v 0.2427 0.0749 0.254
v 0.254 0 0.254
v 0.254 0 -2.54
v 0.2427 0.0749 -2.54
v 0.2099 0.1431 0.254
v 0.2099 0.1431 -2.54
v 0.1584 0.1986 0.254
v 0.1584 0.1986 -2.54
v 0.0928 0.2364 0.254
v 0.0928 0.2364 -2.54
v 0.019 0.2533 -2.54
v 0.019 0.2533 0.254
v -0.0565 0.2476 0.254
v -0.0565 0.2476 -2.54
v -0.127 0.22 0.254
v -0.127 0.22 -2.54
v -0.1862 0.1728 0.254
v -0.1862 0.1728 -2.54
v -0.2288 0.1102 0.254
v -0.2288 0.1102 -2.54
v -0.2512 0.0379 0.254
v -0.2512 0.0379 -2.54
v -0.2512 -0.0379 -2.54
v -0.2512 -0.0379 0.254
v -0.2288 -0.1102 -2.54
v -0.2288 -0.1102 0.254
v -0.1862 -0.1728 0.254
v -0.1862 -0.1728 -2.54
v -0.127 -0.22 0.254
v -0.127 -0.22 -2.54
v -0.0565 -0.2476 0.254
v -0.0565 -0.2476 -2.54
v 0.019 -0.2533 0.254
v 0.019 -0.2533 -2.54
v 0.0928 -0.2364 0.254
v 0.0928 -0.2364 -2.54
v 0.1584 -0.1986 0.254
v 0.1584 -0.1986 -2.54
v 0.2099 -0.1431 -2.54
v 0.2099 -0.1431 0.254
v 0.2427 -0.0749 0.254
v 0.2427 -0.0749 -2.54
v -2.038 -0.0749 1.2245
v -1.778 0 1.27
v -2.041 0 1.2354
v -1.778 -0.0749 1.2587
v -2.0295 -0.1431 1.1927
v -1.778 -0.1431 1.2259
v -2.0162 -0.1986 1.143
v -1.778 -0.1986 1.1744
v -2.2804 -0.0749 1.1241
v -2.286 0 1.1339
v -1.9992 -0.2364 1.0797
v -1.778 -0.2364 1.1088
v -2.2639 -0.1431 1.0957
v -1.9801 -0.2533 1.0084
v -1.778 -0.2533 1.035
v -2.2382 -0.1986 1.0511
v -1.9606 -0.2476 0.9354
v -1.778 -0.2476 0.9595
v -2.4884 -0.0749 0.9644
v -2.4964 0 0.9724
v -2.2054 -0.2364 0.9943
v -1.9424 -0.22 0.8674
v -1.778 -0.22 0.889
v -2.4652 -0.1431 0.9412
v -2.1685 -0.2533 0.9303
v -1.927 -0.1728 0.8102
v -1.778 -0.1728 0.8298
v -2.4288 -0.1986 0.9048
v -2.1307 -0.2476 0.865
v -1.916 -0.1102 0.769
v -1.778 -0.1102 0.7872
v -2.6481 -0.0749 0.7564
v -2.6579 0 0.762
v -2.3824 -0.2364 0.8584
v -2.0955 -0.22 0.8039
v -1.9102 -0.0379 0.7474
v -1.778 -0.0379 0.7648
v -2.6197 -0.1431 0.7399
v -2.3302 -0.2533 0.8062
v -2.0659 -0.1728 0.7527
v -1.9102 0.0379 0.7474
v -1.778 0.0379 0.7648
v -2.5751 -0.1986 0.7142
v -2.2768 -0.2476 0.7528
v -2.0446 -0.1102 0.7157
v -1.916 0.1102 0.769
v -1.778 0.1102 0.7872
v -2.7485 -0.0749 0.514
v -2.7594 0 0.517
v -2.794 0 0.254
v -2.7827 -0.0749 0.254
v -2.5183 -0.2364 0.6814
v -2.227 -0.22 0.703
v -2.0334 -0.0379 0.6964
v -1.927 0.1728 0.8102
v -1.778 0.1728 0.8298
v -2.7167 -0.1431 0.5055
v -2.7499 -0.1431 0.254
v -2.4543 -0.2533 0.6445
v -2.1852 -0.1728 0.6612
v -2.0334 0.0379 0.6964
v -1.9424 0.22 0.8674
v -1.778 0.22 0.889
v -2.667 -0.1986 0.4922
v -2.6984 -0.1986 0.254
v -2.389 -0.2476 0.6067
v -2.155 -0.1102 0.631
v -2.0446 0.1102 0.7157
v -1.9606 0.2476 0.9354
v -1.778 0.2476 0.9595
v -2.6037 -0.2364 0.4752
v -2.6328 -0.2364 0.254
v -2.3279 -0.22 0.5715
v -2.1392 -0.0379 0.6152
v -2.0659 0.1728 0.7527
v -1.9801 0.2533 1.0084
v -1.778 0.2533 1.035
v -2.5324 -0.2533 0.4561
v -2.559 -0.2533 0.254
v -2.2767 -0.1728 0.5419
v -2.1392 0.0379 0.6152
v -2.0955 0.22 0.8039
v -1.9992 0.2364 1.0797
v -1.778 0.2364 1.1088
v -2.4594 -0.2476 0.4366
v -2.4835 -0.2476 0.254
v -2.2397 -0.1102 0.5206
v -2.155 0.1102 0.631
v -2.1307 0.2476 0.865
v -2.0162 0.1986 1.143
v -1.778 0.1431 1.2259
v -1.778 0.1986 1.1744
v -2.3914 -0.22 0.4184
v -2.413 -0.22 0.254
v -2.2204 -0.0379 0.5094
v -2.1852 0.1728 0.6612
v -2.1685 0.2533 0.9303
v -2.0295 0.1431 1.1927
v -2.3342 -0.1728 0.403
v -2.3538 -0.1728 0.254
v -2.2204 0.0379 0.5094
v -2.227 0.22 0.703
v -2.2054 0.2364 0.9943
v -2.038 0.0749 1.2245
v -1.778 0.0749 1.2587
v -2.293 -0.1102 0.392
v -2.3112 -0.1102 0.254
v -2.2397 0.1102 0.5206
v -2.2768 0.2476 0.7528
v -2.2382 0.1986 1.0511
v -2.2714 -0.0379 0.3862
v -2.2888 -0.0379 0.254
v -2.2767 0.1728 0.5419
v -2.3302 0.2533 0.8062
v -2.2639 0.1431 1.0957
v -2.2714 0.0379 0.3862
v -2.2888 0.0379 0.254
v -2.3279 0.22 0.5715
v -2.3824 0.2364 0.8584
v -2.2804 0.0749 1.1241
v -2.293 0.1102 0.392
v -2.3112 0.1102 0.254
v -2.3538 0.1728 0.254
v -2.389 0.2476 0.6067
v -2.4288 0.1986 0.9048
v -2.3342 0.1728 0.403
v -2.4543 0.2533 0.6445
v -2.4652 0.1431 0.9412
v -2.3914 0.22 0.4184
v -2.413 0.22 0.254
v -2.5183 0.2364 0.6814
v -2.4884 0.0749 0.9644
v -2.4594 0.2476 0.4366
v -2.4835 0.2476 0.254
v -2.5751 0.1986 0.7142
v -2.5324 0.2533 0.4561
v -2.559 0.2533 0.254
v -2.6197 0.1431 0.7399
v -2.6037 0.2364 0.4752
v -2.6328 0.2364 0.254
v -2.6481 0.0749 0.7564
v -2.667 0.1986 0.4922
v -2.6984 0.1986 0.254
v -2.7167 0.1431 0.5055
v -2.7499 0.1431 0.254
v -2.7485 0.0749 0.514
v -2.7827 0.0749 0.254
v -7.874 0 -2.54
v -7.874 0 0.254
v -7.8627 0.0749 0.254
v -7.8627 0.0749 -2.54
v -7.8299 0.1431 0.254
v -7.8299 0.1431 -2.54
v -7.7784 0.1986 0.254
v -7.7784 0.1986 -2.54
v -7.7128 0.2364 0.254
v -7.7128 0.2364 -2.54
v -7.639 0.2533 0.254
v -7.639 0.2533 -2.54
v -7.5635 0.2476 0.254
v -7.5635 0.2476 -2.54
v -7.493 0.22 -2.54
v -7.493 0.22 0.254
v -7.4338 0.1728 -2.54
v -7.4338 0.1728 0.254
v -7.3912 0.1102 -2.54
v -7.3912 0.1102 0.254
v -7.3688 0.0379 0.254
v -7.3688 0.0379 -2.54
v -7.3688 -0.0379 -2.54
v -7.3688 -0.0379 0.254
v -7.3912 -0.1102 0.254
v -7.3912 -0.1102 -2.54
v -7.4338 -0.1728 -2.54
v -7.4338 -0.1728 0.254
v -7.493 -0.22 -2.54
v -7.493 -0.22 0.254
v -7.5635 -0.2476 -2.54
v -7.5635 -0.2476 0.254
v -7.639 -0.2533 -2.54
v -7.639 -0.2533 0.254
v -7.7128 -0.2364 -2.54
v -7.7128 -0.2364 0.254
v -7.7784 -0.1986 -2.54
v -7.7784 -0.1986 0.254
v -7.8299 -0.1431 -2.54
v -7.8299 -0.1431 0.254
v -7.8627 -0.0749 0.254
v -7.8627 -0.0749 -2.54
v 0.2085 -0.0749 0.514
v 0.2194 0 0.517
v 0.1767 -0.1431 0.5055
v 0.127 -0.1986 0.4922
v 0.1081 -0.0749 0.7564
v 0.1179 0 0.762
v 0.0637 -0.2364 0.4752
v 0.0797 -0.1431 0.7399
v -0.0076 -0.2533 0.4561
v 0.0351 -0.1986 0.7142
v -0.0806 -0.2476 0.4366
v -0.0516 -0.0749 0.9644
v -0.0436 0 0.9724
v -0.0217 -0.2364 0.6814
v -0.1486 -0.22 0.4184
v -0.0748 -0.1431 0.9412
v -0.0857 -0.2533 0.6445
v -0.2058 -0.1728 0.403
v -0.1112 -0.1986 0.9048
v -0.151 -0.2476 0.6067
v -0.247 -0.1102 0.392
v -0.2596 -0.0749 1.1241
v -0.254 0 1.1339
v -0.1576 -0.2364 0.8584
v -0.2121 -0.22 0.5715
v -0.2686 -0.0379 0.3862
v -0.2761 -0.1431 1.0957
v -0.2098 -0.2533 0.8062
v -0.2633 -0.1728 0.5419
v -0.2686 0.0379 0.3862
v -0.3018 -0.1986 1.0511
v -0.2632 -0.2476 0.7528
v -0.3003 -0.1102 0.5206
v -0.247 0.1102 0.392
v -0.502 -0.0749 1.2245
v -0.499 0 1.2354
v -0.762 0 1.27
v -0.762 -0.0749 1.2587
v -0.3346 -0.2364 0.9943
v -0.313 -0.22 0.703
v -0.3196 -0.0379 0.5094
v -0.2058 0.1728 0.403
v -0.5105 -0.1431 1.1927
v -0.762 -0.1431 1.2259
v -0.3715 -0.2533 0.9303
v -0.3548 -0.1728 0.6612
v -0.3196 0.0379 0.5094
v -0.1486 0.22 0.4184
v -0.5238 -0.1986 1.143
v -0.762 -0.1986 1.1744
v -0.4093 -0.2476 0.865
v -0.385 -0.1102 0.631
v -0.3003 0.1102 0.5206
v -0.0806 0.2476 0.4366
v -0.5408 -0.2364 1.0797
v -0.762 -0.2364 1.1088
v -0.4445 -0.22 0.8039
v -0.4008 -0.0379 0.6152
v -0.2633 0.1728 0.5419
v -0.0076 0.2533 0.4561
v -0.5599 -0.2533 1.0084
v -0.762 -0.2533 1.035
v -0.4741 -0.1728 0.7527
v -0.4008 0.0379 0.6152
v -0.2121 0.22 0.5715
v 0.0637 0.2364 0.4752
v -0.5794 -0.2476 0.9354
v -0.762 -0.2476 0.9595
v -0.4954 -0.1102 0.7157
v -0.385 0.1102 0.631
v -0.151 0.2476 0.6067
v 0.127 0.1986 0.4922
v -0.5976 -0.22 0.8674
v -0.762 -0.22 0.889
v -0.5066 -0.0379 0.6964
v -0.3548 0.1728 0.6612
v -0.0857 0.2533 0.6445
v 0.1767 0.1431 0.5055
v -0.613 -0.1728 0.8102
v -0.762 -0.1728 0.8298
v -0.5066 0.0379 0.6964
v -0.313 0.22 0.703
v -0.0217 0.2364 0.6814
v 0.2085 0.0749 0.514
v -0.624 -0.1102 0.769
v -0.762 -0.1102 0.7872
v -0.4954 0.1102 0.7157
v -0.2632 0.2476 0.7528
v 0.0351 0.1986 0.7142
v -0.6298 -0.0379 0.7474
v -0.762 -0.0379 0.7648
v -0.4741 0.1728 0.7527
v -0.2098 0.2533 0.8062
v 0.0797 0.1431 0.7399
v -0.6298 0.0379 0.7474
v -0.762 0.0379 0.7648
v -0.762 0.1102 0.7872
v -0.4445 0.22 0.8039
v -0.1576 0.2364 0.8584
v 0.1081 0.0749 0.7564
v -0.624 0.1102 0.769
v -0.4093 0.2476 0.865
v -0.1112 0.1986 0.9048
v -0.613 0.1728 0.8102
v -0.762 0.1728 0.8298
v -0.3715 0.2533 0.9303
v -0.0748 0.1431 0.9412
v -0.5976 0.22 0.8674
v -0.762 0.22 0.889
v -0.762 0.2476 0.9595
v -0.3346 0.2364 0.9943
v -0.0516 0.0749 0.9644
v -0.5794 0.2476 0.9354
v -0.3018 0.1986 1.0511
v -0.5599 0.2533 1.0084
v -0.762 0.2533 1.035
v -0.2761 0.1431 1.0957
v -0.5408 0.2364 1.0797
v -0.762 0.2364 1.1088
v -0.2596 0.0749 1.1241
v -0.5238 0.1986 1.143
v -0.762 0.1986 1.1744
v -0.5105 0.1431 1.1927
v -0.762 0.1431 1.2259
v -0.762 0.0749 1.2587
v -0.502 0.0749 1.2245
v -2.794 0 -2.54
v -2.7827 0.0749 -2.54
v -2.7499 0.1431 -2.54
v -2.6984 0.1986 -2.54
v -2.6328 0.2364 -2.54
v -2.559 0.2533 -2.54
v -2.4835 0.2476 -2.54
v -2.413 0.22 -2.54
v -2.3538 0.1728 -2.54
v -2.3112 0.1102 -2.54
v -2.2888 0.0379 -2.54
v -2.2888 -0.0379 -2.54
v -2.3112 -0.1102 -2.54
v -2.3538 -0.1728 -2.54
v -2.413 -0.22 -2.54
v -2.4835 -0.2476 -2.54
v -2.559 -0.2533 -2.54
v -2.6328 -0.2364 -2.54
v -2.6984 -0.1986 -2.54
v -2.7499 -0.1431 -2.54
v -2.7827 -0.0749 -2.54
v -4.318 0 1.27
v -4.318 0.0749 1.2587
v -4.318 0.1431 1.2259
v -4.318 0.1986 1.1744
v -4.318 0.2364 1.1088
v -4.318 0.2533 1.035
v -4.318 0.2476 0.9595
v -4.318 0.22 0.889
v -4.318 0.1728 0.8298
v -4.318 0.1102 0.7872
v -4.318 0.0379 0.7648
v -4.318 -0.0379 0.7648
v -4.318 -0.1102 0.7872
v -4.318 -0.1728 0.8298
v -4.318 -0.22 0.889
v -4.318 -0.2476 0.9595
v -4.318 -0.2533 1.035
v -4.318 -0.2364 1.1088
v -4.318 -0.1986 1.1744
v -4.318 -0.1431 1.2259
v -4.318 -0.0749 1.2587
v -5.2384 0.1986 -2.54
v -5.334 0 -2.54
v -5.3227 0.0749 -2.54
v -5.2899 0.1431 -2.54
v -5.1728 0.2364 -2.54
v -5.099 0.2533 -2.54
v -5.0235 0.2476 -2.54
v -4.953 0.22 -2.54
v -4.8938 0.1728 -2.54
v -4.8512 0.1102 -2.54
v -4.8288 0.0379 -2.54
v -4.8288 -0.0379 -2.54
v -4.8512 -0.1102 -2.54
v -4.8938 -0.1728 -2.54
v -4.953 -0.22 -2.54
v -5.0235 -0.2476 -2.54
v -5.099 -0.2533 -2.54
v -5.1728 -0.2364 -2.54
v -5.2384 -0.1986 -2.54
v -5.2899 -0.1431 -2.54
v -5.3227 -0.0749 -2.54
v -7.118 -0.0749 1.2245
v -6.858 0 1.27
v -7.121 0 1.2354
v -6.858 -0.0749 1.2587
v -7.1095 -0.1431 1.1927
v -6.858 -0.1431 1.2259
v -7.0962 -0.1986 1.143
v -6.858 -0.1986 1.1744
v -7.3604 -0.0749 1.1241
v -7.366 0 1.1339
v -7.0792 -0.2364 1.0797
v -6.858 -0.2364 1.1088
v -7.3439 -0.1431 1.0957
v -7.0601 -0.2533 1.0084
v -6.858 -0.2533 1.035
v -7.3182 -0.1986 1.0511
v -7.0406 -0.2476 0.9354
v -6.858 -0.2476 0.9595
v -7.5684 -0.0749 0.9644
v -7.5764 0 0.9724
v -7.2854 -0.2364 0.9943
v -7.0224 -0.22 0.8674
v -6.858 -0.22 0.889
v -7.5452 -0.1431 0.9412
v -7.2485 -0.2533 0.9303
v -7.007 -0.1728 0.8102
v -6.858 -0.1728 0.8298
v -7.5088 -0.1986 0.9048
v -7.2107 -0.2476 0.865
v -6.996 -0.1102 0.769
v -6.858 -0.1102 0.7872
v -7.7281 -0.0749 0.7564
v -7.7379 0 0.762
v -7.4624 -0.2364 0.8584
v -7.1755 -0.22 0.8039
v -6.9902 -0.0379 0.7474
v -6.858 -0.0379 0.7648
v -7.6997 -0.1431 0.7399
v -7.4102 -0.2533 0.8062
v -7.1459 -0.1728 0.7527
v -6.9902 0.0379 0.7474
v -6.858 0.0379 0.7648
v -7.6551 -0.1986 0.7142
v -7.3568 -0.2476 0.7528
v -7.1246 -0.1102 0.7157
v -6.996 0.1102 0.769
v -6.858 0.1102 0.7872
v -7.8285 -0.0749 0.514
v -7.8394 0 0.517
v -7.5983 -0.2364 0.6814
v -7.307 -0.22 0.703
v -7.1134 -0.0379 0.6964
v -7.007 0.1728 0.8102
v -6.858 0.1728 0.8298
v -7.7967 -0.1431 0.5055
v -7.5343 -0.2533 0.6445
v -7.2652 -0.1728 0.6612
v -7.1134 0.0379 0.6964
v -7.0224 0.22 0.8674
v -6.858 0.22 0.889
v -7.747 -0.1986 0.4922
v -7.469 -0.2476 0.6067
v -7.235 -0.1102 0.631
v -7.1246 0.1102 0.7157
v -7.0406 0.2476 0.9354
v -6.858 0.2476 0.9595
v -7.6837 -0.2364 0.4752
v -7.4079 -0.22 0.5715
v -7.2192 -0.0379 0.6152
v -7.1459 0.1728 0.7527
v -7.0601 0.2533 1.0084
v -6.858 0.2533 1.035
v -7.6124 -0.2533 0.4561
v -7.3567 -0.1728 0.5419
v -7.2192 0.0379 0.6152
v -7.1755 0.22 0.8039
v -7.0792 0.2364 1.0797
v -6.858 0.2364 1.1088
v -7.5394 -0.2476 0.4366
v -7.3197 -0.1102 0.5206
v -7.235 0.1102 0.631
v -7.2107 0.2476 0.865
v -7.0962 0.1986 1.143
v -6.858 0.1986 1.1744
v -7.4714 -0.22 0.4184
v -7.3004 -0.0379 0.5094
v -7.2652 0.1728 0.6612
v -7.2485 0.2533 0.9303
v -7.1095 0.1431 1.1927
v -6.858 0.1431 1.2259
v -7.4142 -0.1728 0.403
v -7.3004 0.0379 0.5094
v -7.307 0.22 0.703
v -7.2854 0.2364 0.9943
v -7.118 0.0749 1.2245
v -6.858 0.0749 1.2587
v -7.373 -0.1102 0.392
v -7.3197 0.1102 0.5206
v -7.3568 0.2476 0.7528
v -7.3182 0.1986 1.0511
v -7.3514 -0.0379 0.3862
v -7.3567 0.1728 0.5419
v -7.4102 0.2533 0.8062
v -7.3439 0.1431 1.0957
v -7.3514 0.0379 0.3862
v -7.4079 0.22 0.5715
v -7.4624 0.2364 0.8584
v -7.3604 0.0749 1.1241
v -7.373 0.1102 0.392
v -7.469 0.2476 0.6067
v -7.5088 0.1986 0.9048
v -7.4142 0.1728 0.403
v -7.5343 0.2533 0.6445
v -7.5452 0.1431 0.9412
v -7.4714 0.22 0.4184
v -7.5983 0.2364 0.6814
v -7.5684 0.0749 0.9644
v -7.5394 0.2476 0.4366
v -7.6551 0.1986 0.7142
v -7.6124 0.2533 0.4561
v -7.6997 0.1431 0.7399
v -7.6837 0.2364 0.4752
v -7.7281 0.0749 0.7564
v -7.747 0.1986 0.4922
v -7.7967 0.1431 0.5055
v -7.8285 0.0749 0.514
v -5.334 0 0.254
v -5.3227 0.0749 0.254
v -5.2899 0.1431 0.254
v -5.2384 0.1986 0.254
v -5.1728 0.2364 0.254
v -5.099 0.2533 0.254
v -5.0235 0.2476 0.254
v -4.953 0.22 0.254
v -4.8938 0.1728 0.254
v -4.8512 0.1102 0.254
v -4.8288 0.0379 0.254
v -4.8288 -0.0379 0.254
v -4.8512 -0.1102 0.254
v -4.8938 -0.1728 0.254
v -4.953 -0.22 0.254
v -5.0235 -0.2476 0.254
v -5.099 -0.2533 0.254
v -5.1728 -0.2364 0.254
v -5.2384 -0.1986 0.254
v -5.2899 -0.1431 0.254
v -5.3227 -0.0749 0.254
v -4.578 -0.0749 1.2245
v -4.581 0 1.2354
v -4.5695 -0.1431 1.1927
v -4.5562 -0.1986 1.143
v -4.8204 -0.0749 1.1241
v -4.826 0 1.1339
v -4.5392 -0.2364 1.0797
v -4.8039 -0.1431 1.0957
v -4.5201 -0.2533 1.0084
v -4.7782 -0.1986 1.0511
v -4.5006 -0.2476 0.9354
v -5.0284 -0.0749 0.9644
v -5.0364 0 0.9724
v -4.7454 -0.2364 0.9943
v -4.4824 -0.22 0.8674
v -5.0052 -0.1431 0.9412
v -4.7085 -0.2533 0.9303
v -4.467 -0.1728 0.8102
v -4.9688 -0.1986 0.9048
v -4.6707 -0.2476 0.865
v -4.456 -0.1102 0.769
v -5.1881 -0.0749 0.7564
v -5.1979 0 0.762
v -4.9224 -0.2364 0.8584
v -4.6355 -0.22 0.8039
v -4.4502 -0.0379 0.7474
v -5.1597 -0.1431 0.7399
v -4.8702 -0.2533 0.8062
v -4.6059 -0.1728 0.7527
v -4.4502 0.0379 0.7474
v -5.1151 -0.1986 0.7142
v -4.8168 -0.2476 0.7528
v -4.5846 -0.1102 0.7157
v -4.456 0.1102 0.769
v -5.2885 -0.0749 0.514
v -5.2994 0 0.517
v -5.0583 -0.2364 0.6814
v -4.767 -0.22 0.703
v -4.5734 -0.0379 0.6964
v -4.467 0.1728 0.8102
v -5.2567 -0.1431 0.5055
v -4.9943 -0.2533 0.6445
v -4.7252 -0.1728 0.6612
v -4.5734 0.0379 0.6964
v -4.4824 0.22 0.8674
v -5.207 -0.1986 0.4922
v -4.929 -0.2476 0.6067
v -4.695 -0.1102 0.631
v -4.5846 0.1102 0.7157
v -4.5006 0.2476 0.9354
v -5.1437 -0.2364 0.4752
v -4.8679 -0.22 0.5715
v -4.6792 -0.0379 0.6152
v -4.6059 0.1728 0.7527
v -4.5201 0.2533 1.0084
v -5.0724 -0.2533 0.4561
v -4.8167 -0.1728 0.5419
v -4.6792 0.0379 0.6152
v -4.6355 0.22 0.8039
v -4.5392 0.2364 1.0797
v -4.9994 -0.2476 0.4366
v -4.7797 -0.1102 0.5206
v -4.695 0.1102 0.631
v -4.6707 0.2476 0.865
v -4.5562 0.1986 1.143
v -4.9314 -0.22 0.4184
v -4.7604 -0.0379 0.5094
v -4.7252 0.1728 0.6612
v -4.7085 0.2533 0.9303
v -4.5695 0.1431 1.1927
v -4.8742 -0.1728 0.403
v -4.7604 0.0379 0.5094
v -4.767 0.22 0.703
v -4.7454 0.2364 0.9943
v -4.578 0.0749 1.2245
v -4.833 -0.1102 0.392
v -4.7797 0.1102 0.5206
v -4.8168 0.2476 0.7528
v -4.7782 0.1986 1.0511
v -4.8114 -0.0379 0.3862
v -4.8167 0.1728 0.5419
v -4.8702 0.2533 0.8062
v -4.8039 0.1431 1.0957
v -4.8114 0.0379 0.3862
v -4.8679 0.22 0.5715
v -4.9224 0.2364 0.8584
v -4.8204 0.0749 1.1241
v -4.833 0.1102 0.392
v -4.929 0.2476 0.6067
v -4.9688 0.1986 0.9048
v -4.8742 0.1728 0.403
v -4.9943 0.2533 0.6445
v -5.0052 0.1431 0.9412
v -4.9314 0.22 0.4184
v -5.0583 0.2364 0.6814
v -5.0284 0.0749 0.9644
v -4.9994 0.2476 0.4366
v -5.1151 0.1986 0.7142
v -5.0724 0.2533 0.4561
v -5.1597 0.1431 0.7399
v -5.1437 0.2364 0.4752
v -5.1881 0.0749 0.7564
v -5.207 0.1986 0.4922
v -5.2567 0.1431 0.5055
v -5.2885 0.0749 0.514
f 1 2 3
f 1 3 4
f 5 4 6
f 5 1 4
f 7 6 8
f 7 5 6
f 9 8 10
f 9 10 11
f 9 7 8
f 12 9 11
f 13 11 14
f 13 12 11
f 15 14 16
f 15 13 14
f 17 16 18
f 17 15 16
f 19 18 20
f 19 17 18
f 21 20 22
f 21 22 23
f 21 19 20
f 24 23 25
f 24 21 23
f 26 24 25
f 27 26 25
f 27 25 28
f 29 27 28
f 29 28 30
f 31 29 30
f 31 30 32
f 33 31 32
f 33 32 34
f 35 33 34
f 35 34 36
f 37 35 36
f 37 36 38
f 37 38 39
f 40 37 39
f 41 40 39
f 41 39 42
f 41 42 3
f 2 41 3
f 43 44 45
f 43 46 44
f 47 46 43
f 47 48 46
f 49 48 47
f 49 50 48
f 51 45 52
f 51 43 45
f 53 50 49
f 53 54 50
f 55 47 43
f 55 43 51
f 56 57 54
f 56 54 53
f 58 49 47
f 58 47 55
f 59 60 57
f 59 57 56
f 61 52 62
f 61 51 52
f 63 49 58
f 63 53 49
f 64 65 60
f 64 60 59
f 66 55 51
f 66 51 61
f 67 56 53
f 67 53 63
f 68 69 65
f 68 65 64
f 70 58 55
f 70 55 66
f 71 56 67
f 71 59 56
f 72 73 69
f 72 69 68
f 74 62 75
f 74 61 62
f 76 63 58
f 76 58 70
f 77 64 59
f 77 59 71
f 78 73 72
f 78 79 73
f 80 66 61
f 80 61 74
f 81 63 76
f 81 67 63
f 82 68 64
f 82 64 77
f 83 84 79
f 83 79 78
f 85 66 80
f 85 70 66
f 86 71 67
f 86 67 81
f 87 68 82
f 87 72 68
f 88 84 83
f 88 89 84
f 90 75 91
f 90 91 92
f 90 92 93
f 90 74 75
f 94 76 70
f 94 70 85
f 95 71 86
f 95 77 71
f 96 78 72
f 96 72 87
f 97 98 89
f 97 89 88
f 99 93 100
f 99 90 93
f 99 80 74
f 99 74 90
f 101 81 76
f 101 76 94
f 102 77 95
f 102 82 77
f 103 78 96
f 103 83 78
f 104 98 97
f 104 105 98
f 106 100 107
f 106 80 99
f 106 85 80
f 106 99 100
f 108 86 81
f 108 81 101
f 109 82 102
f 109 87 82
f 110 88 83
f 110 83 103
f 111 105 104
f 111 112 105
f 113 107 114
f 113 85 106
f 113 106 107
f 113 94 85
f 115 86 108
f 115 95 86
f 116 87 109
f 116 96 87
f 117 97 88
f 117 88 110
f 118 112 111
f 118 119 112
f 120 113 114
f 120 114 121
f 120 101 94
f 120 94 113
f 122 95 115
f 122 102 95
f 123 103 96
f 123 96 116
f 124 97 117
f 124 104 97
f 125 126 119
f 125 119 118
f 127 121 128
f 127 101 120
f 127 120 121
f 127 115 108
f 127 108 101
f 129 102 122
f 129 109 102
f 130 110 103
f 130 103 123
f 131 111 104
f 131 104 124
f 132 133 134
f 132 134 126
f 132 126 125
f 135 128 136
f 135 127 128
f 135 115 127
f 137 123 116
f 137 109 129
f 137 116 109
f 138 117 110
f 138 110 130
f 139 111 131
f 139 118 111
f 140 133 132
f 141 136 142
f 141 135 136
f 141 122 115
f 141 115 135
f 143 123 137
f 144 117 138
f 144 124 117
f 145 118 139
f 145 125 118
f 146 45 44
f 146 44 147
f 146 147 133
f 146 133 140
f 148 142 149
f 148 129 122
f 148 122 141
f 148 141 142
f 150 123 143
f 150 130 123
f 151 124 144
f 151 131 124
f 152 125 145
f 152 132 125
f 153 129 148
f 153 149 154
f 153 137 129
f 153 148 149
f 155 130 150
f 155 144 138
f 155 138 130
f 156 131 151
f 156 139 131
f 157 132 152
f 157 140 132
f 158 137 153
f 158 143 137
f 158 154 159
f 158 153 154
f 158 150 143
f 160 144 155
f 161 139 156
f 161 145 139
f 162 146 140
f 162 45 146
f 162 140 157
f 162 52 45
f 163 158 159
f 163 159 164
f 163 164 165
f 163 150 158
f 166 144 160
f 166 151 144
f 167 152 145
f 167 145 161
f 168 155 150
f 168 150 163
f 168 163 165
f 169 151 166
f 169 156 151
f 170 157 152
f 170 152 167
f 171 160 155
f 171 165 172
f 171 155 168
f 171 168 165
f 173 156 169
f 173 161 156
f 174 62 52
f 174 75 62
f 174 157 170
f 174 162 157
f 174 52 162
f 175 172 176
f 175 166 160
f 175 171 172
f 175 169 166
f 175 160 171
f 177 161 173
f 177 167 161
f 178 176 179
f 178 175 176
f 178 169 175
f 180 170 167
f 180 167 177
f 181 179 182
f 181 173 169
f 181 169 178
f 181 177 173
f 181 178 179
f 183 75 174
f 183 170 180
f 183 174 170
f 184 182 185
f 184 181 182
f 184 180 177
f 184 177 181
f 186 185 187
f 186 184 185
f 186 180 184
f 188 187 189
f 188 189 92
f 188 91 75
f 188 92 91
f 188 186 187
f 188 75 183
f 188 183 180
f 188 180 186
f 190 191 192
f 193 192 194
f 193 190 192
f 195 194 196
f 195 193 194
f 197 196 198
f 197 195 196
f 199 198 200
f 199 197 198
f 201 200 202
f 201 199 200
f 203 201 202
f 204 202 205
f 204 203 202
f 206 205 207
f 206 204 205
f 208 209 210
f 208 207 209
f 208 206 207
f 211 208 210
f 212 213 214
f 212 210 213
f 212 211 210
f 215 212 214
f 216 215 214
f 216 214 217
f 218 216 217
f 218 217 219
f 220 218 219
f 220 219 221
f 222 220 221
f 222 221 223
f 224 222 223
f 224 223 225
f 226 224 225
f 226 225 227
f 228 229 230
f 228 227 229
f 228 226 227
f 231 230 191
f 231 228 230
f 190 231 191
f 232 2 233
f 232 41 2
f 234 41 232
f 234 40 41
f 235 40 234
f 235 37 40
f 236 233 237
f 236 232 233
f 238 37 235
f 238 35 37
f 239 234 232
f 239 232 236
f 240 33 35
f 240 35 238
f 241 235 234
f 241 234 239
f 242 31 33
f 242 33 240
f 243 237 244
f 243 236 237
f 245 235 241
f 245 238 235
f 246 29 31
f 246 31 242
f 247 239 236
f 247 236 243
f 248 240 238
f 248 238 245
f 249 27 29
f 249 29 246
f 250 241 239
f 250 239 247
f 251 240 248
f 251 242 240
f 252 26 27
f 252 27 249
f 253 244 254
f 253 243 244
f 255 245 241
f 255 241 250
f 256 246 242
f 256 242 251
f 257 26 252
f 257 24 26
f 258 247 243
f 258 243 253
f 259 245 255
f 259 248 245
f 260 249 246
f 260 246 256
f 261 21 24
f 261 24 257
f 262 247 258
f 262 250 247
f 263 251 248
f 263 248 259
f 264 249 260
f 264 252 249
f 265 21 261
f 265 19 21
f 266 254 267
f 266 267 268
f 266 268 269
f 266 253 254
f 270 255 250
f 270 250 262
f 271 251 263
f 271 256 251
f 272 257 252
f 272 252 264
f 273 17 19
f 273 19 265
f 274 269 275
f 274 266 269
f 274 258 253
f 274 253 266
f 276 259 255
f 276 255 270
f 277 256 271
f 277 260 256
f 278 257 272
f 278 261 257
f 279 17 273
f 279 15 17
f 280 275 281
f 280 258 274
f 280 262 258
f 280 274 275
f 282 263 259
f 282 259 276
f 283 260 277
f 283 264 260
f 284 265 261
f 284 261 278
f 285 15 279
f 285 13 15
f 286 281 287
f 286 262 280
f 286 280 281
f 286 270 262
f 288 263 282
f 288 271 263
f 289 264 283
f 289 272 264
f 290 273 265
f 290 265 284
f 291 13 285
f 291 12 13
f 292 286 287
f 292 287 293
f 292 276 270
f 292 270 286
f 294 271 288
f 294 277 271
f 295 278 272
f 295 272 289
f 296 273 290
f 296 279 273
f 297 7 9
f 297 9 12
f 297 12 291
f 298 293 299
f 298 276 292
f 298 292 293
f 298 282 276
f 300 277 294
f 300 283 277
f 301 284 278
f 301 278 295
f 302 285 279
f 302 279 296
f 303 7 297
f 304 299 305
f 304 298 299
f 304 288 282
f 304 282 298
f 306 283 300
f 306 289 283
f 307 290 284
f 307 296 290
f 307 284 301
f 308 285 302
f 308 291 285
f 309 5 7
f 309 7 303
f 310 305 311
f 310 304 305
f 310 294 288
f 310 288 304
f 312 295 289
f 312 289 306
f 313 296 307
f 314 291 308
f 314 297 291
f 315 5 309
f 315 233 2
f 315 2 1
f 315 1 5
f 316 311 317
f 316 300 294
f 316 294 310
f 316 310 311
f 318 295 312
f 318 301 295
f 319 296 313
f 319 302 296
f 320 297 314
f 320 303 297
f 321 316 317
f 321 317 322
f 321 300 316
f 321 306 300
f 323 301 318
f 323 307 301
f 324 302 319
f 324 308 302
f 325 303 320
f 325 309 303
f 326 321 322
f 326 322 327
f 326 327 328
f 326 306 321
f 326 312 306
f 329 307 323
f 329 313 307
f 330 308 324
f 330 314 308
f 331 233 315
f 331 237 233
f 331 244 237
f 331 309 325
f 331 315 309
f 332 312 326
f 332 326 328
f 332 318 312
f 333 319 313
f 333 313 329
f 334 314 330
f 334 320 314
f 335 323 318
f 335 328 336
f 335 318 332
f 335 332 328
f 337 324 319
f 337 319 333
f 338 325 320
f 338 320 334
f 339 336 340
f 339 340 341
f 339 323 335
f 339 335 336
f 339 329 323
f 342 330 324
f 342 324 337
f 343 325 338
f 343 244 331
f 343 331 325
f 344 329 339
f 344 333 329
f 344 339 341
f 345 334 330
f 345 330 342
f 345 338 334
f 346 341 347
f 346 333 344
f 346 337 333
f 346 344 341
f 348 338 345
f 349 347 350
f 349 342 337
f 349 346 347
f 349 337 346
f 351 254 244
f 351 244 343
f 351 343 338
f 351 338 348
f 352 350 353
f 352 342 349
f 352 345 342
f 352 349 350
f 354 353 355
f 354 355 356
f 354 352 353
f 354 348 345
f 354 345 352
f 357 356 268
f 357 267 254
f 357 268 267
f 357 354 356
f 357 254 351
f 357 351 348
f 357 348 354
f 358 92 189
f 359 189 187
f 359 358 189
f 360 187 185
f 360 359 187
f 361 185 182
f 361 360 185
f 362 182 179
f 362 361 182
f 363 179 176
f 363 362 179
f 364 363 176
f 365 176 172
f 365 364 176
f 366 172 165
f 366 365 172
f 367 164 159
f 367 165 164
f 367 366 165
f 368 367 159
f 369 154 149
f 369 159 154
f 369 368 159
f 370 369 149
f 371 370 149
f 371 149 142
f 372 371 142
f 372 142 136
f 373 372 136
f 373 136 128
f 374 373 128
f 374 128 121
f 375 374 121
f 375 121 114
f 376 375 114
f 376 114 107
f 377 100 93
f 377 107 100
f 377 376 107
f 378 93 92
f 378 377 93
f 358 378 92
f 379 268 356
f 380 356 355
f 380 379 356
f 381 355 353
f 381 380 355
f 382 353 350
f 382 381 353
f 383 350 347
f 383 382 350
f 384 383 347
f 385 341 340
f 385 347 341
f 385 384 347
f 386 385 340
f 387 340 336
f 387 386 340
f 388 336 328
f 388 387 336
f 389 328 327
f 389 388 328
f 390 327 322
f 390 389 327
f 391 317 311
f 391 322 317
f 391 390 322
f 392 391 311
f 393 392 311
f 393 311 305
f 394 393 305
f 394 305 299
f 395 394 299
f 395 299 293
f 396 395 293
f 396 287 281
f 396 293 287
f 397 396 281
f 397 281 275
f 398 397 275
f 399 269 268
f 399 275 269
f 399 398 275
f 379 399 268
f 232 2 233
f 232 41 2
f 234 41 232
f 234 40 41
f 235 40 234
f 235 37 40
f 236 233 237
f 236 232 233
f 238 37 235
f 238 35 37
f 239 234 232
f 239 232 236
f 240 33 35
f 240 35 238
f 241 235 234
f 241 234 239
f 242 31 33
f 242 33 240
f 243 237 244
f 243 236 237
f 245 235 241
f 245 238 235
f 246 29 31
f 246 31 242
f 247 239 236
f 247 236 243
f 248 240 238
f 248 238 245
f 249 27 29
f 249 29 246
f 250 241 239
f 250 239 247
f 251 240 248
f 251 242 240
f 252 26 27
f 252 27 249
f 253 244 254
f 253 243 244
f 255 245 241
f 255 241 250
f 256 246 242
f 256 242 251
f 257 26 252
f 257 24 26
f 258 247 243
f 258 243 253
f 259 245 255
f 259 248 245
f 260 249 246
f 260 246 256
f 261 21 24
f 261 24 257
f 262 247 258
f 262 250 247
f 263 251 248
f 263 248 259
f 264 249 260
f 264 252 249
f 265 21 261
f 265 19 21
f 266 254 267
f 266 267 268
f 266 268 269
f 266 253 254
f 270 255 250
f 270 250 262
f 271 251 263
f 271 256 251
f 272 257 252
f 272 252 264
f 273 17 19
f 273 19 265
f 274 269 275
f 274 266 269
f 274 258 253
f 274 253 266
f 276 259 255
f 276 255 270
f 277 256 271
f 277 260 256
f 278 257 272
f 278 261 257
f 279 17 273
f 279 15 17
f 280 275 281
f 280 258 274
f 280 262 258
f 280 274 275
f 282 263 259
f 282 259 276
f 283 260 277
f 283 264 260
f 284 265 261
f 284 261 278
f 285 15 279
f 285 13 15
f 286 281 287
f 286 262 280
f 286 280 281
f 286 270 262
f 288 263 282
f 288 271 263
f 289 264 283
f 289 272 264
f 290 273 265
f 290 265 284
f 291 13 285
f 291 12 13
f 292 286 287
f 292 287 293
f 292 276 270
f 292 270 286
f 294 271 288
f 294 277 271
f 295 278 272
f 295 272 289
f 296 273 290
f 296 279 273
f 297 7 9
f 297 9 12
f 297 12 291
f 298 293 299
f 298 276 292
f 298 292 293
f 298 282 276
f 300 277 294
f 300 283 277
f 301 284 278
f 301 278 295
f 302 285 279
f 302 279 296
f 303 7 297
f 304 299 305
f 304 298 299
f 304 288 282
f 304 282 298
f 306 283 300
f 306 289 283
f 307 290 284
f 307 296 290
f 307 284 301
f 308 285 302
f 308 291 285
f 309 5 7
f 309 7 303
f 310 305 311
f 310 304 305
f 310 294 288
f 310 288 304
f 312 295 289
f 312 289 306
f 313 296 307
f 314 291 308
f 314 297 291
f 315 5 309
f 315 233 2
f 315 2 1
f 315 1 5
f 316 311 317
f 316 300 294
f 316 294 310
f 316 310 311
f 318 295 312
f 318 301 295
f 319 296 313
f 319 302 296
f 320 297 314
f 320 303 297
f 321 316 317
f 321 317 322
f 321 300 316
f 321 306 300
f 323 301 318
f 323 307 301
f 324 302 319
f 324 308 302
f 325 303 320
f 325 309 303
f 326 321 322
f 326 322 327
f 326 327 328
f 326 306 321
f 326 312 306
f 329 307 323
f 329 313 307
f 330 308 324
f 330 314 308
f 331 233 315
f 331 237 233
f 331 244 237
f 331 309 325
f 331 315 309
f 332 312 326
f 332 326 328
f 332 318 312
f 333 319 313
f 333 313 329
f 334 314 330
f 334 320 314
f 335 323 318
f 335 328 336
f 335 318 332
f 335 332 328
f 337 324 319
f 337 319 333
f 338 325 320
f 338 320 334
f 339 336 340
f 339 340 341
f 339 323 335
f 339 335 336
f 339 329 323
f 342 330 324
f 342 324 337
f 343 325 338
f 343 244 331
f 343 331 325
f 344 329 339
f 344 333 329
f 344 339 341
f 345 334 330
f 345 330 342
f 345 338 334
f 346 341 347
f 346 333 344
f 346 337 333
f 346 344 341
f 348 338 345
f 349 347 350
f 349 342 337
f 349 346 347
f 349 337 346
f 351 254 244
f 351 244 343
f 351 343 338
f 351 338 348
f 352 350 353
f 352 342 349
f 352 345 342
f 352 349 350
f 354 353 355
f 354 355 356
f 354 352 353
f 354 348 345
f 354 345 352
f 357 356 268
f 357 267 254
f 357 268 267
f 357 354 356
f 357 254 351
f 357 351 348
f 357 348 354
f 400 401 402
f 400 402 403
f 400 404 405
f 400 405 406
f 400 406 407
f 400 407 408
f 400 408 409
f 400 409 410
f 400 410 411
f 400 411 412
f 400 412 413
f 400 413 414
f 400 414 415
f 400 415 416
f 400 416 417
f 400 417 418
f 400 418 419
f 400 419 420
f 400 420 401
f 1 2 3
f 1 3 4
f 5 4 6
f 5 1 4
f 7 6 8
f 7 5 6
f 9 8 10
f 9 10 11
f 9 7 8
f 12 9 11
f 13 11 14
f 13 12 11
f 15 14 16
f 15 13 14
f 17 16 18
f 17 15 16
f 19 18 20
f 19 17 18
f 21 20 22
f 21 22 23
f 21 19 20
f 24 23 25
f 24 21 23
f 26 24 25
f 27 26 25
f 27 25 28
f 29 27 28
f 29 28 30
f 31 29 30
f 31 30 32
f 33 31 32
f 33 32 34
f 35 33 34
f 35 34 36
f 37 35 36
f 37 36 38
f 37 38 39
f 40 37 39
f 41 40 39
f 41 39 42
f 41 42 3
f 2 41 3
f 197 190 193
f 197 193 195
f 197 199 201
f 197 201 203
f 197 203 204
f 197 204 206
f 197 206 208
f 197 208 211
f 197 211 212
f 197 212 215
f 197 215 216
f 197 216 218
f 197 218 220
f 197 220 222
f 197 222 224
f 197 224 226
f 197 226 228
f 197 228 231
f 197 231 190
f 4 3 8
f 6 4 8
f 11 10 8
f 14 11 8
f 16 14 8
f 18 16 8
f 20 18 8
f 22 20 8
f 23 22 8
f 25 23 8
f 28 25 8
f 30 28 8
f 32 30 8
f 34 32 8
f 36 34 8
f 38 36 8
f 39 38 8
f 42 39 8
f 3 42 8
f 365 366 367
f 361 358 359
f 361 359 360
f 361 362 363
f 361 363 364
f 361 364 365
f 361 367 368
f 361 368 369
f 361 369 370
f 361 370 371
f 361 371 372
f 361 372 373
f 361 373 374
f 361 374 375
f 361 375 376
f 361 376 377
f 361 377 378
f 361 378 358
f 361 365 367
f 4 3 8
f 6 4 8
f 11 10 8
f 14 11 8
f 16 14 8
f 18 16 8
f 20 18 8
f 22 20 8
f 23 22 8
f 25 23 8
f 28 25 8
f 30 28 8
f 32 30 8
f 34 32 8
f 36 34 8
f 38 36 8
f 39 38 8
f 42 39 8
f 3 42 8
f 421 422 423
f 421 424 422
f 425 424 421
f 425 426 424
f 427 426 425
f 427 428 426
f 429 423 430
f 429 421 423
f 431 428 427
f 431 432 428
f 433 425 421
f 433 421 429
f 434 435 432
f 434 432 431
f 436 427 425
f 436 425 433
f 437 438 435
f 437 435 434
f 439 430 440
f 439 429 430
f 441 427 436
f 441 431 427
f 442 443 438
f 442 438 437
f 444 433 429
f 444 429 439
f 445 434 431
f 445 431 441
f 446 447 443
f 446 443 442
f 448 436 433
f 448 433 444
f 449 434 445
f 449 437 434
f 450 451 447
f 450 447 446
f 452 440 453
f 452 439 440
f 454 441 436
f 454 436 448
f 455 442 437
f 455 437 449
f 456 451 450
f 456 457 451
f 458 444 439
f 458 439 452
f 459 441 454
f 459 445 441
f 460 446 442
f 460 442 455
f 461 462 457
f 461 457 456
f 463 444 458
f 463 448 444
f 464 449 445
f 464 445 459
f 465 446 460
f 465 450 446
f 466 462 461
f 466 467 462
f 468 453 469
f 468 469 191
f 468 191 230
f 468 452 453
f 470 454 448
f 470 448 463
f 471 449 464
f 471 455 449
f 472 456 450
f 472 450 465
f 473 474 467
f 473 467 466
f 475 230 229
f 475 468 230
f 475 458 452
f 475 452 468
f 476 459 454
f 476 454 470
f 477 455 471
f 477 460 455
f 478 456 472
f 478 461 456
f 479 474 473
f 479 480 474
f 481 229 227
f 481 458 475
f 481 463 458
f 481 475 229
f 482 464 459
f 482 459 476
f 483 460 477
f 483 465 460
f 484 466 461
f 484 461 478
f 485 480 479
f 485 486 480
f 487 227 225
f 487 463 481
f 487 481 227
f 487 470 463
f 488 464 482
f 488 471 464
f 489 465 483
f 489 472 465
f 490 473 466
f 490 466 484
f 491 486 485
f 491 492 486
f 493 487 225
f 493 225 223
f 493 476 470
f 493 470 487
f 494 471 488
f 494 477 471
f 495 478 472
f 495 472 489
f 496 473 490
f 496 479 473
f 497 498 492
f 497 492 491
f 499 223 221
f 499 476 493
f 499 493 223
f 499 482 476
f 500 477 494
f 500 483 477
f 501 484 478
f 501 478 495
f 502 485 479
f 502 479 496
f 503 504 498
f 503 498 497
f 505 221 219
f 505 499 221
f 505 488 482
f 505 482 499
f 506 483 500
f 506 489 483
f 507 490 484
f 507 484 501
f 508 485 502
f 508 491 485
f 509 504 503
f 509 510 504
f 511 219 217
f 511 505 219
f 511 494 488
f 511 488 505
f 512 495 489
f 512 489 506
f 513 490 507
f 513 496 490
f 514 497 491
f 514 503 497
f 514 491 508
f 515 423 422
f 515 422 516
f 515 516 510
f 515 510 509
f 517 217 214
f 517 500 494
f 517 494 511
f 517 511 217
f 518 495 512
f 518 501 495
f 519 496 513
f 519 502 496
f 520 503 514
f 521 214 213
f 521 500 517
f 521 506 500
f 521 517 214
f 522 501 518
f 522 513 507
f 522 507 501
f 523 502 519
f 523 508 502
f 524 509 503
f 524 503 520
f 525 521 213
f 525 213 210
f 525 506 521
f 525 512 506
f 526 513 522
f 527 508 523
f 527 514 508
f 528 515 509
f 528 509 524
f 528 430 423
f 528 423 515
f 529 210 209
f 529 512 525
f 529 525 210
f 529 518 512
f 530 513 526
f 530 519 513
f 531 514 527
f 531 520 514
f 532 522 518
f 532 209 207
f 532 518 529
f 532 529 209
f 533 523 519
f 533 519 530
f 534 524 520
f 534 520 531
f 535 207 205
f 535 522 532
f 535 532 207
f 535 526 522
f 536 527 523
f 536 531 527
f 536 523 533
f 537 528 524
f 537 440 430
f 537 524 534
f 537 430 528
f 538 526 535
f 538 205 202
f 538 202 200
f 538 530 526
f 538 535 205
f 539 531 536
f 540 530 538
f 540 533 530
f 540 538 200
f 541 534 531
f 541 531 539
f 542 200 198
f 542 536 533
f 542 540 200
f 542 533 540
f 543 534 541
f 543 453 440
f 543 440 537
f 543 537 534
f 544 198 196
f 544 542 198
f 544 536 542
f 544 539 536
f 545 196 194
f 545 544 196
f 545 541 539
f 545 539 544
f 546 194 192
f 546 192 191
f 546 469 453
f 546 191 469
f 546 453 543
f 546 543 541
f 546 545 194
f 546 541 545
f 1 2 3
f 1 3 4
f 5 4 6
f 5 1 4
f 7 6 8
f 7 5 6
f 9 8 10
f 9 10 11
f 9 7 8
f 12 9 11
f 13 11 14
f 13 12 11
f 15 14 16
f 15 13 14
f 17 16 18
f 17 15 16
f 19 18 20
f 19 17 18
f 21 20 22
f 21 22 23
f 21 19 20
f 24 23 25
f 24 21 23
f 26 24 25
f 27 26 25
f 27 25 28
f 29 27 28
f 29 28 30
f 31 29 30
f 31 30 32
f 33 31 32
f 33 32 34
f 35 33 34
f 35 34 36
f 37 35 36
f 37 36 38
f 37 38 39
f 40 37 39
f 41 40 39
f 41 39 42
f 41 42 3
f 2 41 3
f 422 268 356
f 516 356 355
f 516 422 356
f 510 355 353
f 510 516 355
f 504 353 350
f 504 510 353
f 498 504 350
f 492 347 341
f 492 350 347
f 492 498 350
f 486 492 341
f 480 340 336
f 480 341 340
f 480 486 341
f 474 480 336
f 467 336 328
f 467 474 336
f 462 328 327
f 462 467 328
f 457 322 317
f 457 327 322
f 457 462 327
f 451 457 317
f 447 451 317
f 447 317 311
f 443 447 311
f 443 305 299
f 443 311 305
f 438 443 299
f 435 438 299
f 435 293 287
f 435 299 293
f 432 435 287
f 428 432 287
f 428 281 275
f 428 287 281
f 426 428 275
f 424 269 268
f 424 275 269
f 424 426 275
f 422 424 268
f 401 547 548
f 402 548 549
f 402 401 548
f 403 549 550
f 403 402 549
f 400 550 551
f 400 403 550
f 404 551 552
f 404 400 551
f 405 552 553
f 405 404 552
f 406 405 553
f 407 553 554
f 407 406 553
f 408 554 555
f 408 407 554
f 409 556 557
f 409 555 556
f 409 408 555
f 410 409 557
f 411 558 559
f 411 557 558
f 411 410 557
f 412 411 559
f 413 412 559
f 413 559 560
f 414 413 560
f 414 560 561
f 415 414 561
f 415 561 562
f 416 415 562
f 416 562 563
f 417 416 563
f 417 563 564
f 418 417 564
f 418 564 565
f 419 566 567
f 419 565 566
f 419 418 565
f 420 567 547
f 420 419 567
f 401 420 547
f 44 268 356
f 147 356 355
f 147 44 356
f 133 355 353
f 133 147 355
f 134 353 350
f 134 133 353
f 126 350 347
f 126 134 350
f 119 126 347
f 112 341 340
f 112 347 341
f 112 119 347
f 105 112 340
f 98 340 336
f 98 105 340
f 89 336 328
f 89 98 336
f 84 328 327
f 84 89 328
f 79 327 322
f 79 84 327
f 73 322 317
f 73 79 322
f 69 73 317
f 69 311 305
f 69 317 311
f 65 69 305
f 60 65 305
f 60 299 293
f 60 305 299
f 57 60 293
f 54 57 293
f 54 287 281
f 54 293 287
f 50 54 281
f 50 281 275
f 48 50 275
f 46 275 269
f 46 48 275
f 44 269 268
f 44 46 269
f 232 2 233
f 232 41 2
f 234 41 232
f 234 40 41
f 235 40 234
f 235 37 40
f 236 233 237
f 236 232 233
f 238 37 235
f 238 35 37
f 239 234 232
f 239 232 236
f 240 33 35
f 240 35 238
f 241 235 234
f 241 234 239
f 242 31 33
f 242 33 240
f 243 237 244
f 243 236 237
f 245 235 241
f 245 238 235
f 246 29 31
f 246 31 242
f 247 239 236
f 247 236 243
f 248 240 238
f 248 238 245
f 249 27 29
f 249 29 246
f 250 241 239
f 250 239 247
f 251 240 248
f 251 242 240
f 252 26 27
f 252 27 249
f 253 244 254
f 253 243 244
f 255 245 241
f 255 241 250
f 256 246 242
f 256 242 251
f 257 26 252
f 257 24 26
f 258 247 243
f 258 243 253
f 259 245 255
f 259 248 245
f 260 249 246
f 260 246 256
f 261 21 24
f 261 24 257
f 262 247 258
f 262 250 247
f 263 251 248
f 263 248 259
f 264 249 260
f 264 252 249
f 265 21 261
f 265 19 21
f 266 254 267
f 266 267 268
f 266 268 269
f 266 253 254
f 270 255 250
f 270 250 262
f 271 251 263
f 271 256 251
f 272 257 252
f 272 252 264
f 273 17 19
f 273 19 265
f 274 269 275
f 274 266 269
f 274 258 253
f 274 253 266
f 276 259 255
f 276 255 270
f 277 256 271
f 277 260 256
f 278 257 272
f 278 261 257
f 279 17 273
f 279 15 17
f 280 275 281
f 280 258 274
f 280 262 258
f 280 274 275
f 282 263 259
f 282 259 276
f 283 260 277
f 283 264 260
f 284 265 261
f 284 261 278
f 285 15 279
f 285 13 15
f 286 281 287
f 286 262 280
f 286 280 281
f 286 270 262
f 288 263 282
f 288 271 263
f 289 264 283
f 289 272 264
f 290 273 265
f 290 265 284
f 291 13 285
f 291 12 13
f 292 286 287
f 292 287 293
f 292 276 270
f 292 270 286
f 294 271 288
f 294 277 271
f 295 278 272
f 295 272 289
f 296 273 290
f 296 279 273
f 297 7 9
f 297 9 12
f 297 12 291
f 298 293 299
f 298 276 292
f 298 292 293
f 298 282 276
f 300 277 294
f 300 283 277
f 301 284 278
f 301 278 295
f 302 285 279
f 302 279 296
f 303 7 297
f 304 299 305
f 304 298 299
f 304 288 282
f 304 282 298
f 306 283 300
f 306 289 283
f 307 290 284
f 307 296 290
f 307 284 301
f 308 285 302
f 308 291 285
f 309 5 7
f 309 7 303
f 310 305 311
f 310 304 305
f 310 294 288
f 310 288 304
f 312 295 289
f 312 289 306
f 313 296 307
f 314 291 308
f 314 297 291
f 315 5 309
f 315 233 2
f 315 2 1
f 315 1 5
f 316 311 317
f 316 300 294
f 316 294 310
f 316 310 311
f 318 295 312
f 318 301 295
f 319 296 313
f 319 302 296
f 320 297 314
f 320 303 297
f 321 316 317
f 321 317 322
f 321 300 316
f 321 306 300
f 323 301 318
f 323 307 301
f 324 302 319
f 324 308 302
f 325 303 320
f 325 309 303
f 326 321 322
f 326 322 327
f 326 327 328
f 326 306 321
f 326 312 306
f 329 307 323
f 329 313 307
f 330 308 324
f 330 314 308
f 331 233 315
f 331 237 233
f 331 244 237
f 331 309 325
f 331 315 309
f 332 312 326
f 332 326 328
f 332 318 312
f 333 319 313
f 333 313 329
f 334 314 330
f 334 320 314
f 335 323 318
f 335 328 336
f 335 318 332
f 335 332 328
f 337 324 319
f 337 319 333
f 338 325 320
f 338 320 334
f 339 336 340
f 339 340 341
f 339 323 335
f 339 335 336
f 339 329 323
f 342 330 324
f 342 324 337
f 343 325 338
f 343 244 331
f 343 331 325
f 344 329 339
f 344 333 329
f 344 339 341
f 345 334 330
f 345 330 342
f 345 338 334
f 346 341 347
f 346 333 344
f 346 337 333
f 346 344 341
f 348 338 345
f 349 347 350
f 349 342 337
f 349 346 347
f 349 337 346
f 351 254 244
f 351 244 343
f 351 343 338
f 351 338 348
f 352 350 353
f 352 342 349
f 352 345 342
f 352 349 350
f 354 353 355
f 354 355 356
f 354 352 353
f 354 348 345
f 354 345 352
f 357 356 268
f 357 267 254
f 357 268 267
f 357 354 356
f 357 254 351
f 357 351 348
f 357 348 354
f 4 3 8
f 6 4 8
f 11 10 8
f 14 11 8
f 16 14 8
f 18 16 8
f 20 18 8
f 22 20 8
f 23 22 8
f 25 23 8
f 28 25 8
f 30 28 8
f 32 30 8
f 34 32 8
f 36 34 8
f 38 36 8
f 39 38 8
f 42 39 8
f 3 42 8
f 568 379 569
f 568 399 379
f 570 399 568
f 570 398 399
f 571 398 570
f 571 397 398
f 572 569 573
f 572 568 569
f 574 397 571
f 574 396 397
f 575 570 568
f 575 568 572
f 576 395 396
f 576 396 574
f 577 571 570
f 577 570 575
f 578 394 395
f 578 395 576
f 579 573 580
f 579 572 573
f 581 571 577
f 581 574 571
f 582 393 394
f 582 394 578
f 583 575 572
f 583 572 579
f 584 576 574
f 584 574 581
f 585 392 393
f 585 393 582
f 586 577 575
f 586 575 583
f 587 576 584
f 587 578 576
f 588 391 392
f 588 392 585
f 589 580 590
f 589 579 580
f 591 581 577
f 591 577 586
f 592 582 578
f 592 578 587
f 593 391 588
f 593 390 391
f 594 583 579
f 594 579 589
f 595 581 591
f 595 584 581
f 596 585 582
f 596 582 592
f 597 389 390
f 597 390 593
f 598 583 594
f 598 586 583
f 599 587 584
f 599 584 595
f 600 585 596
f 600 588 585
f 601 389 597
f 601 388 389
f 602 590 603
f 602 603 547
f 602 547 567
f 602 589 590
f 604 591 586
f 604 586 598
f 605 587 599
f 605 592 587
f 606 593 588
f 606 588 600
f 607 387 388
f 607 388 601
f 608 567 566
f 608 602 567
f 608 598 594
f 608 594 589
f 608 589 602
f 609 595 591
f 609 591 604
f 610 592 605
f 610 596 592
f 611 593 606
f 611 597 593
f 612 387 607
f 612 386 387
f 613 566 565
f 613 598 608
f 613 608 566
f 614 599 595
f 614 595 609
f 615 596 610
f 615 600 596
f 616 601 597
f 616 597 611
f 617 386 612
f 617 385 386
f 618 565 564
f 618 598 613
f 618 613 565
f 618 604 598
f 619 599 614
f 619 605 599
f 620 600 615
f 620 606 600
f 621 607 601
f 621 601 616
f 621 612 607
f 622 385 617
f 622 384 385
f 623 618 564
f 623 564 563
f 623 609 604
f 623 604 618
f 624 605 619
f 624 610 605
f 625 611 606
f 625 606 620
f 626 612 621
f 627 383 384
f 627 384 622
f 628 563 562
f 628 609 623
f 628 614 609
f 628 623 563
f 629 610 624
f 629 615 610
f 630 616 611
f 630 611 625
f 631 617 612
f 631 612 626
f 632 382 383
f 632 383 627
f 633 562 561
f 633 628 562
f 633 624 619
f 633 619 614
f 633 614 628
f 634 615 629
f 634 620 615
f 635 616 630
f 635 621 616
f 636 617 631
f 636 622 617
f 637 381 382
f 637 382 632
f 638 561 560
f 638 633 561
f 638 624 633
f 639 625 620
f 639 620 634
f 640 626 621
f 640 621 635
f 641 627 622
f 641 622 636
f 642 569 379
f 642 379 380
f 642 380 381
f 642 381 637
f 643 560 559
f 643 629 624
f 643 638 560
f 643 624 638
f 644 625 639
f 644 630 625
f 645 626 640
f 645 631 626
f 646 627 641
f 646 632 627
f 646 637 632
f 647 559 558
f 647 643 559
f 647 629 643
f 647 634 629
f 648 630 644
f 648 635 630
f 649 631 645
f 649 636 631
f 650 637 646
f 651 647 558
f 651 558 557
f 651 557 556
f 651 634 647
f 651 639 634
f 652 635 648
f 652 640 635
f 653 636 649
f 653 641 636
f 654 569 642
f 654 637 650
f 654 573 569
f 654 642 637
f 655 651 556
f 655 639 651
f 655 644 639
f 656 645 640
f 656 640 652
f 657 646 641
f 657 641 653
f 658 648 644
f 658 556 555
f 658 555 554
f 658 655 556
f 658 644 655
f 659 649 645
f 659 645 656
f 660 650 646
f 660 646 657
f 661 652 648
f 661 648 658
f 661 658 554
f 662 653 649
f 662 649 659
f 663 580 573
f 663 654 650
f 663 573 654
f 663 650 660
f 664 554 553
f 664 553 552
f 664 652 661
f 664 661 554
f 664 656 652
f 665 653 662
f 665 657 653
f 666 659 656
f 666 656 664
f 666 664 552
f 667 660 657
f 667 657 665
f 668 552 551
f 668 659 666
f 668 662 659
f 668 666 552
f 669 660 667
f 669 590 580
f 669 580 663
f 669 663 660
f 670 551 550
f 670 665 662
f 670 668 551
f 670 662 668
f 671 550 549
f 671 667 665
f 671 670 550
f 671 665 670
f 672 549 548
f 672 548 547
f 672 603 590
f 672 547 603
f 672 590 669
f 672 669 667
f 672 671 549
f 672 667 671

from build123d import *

# Parameters (mm, degrees)
F2_R = 0.254


with BuildPart() as f3:
    # F3: sweep along a path in F0
    with BuildLine(Plane.XZ) as f3_path:
        Line((0, -2.54), (0, 0.254))
        ThreePointArc((0, 0.254), (-0.2231846327, 0.7928153673), (-0.762, 1.016))
        Line((-0.762, 1.016), (-4.318, 1.016))
        ThreePointArc((-4.318, 1.016), (-4.8568153673, 0.7928153673), (-5.08, 0.254))
        Line((-5.08, 0.254), (-5.08, -2.54))
    # F2 (on offset) → F3 (sweep)
    with BuildSketch(Plane.XY.offset(-2.54)):
        Circle(F2_R)
    sweep(path=f3_path.line)


with BuildPart() as f5:
    # F5: sweep along a path in F4
    with BuildLine(Plane.XZ) as f5_path:
        Line((0, -2.54), (0, 0.254))
        ThreePointArc((0, 0.254), (-0.2231846327, 0.7928153673), (-0.762, 1.016))
        Line((-0.762, 1.016), (-6.858, 1.016))
        ThreePointArc((-6.858, 1.016), (-7.3968153673, 0.7928153673), (-7.62, 0.254))
        Line((-7.62, 0.254), (-7.62, -2.54))
    # F2 (on offset) → F5 (sweep)
    with BuildSketch(Plane.XY.offset(-2.54)):
        Circle(F2_R)
    sweep(path=f5_path.line)


with BuildPart() as f7:
    # F7: sweep along a path in F6
    with BuildLine(Plane.XZ) as f7_path:
        Line((0, -2.54), (0, 0.254))
        ThreePointArc((0, 0.254), (-0.2231846327, 0.7928153673), (-0.762, 1.016))
        Line((-0.762, 1.016), (-1.778, 1.016))
        ThreePointArc((-1.778, 1.016), (-2.3168153673, 0.7928153673), (-2.54, 0.254))
        Line((-2.54, 0.254), (-2.54, -2.54))
    # F2 (on offset) → F7 (sweep)
    with BuildSketch(Plane.XY.offset(-2.54)):
        Circle(F2_R)
    sweep(path=f7_path.line)


solid = Compound([f3.part, f5.part, f7.part])
